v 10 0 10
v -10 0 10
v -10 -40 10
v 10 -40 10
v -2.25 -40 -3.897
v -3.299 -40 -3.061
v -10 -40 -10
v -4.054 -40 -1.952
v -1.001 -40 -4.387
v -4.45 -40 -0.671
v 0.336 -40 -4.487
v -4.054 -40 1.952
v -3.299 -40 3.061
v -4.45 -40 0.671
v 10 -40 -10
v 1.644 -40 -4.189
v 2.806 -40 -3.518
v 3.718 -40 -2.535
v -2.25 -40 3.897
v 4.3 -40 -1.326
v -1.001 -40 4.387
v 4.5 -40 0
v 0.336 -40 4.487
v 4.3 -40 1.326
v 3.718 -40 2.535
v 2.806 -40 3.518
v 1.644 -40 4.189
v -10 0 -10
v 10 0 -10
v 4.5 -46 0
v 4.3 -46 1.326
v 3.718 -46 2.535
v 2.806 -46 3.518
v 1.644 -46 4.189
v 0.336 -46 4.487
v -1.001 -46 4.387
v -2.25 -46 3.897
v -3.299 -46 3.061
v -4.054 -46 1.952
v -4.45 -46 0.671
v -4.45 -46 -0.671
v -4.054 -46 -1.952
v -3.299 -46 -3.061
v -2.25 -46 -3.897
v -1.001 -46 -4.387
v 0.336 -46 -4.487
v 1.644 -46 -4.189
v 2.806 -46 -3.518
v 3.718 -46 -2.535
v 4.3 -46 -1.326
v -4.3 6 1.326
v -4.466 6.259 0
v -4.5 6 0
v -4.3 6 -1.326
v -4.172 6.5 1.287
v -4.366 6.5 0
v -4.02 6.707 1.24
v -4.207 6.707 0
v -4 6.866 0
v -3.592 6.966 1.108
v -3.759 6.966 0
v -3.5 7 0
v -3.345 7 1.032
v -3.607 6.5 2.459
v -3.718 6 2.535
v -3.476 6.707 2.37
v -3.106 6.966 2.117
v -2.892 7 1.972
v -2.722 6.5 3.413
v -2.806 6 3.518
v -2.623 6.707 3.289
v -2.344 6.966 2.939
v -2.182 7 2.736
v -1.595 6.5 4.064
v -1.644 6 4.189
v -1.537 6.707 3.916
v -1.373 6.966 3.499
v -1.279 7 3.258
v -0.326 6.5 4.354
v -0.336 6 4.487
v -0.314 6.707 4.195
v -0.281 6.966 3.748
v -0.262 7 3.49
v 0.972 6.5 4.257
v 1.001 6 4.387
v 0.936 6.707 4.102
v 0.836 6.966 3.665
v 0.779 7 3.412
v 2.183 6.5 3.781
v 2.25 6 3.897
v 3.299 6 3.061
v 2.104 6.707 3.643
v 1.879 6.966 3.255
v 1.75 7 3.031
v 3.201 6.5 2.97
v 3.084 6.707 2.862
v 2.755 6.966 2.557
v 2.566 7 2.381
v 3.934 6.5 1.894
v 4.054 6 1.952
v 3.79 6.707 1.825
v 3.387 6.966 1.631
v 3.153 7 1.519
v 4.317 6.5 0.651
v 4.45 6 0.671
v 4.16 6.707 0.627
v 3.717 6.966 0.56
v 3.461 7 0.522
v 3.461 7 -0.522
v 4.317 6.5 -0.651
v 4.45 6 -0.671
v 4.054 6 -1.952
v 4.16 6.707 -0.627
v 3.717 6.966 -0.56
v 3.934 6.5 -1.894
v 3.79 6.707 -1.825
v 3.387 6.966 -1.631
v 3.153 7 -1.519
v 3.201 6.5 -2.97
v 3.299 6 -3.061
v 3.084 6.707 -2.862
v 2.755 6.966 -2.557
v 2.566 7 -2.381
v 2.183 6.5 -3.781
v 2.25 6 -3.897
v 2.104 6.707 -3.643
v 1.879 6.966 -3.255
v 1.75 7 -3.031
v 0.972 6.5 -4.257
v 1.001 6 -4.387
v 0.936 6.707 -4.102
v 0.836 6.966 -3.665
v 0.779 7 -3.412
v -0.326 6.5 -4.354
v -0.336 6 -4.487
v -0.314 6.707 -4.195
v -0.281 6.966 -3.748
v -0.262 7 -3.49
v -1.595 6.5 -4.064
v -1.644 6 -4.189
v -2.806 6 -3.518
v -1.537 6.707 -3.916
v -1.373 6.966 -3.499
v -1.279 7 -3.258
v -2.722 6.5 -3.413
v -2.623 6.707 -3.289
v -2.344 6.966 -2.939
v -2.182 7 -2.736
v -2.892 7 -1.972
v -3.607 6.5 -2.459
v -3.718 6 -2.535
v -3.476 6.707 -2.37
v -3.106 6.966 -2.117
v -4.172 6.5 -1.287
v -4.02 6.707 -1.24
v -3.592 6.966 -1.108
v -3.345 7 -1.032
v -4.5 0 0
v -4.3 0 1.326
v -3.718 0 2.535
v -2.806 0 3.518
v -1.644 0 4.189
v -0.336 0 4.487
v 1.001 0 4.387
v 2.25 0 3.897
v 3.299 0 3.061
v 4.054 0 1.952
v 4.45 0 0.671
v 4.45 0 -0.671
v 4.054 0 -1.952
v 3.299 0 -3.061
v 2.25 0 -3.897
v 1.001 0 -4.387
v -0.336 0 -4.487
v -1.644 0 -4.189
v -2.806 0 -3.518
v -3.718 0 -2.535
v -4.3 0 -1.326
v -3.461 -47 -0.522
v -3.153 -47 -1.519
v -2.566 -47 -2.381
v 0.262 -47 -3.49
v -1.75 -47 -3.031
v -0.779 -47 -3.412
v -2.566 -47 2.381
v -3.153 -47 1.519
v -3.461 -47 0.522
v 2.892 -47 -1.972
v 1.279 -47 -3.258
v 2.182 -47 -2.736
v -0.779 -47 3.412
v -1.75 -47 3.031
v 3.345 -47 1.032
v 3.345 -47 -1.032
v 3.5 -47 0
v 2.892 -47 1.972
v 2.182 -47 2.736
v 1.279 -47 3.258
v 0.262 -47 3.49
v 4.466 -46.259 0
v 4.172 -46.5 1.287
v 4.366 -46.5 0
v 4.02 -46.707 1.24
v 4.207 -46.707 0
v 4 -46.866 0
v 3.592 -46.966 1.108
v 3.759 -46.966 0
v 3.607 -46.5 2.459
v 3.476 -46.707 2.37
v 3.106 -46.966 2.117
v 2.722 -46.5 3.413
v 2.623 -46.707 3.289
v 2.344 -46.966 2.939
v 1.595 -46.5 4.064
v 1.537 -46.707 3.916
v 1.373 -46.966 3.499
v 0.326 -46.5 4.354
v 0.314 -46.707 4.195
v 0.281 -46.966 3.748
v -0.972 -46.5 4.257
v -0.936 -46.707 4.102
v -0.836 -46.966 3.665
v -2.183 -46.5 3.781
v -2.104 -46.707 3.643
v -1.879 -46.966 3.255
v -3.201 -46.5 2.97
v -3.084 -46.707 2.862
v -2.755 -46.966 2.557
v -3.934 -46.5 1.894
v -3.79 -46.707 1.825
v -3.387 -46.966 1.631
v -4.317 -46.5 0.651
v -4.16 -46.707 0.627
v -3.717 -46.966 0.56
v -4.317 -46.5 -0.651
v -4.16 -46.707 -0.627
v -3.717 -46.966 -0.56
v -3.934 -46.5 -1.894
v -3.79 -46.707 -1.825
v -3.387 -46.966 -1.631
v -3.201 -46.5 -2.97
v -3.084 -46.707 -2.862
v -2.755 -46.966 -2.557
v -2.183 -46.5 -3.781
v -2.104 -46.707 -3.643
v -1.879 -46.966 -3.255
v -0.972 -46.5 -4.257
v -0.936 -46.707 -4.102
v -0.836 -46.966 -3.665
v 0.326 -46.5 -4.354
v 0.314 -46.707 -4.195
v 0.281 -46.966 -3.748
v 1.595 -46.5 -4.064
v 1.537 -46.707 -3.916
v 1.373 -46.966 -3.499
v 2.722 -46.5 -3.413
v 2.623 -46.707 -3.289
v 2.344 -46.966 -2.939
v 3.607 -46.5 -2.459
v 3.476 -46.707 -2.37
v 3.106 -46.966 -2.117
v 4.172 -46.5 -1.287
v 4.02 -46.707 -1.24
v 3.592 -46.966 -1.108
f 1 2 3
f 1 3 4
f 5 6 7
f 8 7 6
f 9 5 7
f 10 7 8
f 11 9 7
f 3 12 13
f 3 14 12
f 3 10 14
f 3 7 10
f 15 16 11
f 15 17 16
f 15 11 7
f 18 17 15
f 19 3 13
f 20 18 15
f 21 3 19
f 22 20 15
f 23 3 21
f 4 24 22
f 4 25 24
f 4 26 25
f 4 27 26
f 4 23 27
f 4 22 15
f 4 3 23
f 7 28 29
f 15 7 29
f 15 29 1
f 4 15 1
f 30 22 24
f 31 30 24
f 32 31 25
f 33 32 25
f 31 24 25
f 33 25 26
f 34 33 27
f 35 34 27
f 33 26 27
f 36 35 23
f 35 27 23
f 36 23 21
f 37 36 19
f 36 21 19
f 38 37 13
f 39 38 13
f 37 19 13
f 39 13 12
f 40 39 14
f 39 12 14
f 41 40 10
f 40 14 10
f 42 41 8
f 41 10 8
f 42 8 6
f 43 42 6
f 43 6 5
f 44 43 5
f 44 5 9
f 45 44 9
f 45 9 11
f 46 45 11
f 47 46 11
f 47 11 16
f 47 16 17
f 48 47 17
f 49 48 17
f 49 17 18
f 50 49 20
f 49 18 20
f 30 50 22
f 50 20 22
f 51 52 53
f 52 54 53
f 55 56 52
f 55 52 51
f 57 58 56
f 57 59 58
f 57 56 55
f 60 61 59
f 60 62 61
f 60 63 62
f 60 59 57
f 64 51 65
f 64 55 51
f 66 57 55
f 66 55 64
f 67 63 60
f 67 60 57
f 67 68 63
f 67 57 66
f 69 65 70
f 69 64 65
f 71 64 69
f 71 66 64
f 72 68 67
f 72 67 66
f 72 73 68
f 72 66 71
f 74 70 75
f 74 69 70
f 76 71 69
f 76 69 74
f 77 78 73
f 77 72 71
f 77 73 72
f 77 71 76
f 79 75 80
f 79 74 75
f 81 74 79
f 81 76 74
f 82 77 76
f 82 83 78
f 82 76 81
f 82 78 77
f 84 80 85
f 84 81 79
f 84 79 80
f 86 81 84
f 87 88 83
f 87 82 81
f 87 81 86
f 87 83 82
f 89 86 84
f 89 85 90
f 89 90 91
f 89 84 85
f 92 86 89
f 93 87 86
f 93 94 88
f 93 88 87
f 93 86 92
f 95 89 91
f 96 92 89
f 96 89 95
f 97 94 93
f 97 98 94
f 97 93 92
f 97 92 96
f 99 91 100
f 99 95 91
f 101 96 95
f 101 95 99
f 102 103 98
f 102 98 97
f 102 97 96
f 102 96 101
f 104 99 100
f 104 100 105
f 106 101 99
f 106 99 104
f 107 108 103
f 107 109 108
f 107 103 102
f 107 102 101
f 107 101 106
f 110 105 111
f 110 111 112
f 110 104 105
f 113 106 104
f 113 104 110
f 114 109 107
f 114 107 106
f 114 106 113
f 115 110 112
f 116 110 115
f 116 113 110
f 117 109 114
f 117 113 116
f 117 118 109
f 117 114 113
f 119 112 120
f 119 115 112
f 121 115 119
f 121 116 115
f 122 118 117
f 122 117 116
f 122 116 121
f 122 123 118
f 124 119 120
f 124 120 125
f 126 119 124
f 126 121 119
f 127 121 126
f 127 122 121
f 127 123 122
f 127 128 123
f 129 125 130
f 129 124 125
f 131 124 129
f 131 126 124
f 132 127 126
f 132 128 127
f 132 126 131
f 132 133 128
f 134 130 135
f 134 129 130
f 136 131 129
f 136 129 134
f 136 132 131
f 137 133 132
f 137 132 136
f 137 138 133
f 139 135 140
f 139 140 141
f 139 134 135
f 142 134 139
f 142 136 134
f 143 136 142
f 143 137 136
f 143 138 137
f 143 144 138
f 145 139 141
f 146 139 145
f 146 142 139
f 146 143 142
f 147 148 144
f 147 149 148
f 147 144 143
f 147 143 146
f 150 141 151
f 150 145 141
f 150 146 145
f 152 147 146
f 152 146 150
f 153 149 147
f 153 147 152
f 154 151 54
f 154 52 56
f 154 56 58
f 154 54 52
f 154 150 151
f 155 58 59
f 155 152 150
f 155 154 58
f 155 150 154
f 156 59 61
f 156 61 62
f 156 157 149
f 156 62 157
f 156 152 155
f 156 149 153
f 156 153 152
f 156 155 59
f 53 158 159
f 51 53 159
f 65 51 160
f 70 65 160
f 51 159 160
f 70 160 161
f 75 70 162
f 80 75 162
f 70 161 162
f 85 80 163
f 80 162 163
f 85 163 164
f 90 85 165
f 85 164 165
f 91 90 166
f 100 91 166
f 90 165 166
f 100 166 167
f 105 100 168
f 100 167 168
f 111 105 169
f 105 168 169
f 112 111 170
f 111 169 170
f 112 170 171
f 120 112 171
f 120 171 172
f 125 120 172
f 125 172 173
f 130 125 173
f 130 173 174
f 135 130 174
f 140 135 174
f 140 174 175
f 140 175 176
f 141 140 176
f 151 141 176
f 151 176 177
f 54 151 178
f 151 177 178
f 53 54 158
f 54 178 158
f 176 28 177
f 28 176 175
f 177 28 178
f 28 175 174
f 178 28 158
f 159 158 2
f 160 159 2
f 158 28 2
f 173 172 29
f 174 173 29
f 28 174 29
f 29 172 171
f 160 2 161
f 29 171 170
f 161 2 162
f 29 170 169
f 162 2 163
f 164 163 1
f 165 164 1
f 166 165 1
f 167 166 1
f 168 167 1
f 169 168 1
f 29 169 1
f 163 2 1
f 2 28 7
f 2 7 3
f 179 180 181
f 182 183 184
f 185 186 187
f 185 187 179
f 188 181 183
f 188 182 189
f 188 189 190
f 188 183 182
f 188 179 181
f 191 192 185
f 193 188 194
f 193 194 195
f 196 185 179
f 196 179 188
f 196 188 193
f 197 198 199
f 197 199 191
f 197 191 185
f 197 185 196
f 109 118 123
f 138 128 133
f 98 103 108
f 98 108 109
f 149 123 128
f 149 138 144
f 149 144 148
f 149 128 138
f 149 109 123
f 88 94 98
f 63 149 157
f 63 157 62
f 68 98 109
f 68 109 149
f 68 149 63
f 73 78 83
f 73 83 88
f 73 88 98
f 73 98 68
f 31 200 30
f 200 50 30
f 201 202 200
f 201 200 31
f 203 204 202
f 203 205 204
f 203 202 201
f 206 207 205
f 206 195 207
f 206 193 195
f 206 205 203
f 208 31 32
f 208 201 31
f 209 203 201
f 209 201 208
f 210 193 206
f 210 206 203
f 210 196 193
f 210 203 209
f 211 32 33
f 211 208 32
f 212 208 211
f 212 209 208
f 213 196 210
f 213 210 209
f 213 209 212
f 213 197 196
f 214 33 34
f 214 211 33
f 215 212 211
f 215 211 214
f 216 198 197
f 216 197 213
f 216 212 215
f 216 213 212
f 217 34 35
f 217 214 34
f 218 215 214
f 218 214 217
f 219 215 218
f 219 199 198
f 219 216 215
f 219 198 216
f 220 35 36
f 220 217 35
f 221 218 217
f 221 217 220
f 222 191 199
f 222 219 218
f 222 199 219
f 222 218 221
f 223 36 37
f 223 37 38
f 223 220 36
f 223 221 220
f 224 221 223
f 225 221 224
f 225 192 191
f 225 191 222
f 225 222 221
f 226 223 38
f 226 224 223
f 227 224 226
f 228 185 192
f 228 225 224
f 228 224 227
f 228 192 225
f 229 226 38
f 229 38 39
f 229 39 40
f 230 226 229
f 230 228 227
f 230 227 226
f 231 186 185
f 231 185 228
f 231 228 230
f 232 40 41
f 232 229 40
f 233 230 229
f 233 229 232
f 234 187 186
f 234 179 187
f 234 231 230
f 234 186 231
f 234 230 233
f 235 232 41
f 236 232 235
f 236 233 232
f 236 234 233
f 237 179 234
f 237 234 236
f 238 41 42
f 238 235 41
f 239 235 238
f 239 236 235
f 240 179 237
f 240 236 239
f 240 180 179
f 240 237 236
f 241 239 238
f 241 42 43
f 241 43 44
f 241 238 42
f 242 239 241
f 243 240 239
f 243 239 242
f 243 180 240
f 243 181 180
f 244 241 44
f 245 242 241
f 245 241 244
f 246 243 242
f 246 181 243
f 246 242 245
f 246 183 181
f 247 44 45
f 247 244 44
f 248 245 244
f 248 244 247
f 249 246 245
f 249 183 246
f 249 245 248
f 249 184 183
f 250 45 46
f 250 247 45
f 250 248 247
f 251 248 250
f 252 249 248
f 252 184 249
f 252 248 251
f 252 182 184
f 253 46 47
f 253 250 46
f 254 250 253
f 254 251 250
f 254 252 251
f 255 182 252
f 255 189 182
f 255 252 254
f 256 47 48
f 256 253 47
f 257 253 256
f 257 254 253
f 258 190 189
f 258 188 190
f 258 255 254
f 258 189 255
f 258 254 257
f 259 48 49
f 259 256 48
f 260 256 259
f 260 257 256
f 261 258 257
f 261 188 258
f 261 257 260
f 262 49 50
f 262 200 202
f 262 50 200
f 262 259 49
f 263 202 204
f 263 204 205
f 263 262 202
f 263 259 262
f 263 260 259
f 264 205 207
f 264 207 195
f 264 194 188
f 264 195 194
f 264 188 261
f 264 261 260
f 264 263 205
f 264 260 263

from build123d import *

# Parameters (mm, degrees)
F0_W     = 20
F0_H     = 20
F1_DEPTH = 40
F2_R     = 4.5
F3_DEPTH = 7
F4_R     = 4.5
F5_DEPTH = 7
F6_R     = 1


with BuildPart() as f1:
    # F0 (on Front) → F1 (new body)
    with BuildSketch(Plane.XZ):
        Rectangle(F0_W, F0_H)
    extrude(amount=F1_DEPTH)

    # F2 (on face) → F3 (join)
    with BuildSketch(Plane(origin=(0, 0, 0), x_dir=(-1, 0, 0), z_dir=(0, 1, 0))):
        Circle(F2_R)
    extrude(amount=F3_DEPTH)

    # F4 (on face) → F5 (join)
    with BuildSketch(Plane.XZ.offset(40)):
        Circle(F4_R)
    extrude(amount=F5_DEPTH)

    # F6
    f6_edges = [f1.edges().sort_by_distance(p)[0] for p in [
        (-4.5, -47, 0),
        (4.5, 7, 0),
    ]]
    fillet(f6_edges, radius=F6_R)


solid = f1.part
